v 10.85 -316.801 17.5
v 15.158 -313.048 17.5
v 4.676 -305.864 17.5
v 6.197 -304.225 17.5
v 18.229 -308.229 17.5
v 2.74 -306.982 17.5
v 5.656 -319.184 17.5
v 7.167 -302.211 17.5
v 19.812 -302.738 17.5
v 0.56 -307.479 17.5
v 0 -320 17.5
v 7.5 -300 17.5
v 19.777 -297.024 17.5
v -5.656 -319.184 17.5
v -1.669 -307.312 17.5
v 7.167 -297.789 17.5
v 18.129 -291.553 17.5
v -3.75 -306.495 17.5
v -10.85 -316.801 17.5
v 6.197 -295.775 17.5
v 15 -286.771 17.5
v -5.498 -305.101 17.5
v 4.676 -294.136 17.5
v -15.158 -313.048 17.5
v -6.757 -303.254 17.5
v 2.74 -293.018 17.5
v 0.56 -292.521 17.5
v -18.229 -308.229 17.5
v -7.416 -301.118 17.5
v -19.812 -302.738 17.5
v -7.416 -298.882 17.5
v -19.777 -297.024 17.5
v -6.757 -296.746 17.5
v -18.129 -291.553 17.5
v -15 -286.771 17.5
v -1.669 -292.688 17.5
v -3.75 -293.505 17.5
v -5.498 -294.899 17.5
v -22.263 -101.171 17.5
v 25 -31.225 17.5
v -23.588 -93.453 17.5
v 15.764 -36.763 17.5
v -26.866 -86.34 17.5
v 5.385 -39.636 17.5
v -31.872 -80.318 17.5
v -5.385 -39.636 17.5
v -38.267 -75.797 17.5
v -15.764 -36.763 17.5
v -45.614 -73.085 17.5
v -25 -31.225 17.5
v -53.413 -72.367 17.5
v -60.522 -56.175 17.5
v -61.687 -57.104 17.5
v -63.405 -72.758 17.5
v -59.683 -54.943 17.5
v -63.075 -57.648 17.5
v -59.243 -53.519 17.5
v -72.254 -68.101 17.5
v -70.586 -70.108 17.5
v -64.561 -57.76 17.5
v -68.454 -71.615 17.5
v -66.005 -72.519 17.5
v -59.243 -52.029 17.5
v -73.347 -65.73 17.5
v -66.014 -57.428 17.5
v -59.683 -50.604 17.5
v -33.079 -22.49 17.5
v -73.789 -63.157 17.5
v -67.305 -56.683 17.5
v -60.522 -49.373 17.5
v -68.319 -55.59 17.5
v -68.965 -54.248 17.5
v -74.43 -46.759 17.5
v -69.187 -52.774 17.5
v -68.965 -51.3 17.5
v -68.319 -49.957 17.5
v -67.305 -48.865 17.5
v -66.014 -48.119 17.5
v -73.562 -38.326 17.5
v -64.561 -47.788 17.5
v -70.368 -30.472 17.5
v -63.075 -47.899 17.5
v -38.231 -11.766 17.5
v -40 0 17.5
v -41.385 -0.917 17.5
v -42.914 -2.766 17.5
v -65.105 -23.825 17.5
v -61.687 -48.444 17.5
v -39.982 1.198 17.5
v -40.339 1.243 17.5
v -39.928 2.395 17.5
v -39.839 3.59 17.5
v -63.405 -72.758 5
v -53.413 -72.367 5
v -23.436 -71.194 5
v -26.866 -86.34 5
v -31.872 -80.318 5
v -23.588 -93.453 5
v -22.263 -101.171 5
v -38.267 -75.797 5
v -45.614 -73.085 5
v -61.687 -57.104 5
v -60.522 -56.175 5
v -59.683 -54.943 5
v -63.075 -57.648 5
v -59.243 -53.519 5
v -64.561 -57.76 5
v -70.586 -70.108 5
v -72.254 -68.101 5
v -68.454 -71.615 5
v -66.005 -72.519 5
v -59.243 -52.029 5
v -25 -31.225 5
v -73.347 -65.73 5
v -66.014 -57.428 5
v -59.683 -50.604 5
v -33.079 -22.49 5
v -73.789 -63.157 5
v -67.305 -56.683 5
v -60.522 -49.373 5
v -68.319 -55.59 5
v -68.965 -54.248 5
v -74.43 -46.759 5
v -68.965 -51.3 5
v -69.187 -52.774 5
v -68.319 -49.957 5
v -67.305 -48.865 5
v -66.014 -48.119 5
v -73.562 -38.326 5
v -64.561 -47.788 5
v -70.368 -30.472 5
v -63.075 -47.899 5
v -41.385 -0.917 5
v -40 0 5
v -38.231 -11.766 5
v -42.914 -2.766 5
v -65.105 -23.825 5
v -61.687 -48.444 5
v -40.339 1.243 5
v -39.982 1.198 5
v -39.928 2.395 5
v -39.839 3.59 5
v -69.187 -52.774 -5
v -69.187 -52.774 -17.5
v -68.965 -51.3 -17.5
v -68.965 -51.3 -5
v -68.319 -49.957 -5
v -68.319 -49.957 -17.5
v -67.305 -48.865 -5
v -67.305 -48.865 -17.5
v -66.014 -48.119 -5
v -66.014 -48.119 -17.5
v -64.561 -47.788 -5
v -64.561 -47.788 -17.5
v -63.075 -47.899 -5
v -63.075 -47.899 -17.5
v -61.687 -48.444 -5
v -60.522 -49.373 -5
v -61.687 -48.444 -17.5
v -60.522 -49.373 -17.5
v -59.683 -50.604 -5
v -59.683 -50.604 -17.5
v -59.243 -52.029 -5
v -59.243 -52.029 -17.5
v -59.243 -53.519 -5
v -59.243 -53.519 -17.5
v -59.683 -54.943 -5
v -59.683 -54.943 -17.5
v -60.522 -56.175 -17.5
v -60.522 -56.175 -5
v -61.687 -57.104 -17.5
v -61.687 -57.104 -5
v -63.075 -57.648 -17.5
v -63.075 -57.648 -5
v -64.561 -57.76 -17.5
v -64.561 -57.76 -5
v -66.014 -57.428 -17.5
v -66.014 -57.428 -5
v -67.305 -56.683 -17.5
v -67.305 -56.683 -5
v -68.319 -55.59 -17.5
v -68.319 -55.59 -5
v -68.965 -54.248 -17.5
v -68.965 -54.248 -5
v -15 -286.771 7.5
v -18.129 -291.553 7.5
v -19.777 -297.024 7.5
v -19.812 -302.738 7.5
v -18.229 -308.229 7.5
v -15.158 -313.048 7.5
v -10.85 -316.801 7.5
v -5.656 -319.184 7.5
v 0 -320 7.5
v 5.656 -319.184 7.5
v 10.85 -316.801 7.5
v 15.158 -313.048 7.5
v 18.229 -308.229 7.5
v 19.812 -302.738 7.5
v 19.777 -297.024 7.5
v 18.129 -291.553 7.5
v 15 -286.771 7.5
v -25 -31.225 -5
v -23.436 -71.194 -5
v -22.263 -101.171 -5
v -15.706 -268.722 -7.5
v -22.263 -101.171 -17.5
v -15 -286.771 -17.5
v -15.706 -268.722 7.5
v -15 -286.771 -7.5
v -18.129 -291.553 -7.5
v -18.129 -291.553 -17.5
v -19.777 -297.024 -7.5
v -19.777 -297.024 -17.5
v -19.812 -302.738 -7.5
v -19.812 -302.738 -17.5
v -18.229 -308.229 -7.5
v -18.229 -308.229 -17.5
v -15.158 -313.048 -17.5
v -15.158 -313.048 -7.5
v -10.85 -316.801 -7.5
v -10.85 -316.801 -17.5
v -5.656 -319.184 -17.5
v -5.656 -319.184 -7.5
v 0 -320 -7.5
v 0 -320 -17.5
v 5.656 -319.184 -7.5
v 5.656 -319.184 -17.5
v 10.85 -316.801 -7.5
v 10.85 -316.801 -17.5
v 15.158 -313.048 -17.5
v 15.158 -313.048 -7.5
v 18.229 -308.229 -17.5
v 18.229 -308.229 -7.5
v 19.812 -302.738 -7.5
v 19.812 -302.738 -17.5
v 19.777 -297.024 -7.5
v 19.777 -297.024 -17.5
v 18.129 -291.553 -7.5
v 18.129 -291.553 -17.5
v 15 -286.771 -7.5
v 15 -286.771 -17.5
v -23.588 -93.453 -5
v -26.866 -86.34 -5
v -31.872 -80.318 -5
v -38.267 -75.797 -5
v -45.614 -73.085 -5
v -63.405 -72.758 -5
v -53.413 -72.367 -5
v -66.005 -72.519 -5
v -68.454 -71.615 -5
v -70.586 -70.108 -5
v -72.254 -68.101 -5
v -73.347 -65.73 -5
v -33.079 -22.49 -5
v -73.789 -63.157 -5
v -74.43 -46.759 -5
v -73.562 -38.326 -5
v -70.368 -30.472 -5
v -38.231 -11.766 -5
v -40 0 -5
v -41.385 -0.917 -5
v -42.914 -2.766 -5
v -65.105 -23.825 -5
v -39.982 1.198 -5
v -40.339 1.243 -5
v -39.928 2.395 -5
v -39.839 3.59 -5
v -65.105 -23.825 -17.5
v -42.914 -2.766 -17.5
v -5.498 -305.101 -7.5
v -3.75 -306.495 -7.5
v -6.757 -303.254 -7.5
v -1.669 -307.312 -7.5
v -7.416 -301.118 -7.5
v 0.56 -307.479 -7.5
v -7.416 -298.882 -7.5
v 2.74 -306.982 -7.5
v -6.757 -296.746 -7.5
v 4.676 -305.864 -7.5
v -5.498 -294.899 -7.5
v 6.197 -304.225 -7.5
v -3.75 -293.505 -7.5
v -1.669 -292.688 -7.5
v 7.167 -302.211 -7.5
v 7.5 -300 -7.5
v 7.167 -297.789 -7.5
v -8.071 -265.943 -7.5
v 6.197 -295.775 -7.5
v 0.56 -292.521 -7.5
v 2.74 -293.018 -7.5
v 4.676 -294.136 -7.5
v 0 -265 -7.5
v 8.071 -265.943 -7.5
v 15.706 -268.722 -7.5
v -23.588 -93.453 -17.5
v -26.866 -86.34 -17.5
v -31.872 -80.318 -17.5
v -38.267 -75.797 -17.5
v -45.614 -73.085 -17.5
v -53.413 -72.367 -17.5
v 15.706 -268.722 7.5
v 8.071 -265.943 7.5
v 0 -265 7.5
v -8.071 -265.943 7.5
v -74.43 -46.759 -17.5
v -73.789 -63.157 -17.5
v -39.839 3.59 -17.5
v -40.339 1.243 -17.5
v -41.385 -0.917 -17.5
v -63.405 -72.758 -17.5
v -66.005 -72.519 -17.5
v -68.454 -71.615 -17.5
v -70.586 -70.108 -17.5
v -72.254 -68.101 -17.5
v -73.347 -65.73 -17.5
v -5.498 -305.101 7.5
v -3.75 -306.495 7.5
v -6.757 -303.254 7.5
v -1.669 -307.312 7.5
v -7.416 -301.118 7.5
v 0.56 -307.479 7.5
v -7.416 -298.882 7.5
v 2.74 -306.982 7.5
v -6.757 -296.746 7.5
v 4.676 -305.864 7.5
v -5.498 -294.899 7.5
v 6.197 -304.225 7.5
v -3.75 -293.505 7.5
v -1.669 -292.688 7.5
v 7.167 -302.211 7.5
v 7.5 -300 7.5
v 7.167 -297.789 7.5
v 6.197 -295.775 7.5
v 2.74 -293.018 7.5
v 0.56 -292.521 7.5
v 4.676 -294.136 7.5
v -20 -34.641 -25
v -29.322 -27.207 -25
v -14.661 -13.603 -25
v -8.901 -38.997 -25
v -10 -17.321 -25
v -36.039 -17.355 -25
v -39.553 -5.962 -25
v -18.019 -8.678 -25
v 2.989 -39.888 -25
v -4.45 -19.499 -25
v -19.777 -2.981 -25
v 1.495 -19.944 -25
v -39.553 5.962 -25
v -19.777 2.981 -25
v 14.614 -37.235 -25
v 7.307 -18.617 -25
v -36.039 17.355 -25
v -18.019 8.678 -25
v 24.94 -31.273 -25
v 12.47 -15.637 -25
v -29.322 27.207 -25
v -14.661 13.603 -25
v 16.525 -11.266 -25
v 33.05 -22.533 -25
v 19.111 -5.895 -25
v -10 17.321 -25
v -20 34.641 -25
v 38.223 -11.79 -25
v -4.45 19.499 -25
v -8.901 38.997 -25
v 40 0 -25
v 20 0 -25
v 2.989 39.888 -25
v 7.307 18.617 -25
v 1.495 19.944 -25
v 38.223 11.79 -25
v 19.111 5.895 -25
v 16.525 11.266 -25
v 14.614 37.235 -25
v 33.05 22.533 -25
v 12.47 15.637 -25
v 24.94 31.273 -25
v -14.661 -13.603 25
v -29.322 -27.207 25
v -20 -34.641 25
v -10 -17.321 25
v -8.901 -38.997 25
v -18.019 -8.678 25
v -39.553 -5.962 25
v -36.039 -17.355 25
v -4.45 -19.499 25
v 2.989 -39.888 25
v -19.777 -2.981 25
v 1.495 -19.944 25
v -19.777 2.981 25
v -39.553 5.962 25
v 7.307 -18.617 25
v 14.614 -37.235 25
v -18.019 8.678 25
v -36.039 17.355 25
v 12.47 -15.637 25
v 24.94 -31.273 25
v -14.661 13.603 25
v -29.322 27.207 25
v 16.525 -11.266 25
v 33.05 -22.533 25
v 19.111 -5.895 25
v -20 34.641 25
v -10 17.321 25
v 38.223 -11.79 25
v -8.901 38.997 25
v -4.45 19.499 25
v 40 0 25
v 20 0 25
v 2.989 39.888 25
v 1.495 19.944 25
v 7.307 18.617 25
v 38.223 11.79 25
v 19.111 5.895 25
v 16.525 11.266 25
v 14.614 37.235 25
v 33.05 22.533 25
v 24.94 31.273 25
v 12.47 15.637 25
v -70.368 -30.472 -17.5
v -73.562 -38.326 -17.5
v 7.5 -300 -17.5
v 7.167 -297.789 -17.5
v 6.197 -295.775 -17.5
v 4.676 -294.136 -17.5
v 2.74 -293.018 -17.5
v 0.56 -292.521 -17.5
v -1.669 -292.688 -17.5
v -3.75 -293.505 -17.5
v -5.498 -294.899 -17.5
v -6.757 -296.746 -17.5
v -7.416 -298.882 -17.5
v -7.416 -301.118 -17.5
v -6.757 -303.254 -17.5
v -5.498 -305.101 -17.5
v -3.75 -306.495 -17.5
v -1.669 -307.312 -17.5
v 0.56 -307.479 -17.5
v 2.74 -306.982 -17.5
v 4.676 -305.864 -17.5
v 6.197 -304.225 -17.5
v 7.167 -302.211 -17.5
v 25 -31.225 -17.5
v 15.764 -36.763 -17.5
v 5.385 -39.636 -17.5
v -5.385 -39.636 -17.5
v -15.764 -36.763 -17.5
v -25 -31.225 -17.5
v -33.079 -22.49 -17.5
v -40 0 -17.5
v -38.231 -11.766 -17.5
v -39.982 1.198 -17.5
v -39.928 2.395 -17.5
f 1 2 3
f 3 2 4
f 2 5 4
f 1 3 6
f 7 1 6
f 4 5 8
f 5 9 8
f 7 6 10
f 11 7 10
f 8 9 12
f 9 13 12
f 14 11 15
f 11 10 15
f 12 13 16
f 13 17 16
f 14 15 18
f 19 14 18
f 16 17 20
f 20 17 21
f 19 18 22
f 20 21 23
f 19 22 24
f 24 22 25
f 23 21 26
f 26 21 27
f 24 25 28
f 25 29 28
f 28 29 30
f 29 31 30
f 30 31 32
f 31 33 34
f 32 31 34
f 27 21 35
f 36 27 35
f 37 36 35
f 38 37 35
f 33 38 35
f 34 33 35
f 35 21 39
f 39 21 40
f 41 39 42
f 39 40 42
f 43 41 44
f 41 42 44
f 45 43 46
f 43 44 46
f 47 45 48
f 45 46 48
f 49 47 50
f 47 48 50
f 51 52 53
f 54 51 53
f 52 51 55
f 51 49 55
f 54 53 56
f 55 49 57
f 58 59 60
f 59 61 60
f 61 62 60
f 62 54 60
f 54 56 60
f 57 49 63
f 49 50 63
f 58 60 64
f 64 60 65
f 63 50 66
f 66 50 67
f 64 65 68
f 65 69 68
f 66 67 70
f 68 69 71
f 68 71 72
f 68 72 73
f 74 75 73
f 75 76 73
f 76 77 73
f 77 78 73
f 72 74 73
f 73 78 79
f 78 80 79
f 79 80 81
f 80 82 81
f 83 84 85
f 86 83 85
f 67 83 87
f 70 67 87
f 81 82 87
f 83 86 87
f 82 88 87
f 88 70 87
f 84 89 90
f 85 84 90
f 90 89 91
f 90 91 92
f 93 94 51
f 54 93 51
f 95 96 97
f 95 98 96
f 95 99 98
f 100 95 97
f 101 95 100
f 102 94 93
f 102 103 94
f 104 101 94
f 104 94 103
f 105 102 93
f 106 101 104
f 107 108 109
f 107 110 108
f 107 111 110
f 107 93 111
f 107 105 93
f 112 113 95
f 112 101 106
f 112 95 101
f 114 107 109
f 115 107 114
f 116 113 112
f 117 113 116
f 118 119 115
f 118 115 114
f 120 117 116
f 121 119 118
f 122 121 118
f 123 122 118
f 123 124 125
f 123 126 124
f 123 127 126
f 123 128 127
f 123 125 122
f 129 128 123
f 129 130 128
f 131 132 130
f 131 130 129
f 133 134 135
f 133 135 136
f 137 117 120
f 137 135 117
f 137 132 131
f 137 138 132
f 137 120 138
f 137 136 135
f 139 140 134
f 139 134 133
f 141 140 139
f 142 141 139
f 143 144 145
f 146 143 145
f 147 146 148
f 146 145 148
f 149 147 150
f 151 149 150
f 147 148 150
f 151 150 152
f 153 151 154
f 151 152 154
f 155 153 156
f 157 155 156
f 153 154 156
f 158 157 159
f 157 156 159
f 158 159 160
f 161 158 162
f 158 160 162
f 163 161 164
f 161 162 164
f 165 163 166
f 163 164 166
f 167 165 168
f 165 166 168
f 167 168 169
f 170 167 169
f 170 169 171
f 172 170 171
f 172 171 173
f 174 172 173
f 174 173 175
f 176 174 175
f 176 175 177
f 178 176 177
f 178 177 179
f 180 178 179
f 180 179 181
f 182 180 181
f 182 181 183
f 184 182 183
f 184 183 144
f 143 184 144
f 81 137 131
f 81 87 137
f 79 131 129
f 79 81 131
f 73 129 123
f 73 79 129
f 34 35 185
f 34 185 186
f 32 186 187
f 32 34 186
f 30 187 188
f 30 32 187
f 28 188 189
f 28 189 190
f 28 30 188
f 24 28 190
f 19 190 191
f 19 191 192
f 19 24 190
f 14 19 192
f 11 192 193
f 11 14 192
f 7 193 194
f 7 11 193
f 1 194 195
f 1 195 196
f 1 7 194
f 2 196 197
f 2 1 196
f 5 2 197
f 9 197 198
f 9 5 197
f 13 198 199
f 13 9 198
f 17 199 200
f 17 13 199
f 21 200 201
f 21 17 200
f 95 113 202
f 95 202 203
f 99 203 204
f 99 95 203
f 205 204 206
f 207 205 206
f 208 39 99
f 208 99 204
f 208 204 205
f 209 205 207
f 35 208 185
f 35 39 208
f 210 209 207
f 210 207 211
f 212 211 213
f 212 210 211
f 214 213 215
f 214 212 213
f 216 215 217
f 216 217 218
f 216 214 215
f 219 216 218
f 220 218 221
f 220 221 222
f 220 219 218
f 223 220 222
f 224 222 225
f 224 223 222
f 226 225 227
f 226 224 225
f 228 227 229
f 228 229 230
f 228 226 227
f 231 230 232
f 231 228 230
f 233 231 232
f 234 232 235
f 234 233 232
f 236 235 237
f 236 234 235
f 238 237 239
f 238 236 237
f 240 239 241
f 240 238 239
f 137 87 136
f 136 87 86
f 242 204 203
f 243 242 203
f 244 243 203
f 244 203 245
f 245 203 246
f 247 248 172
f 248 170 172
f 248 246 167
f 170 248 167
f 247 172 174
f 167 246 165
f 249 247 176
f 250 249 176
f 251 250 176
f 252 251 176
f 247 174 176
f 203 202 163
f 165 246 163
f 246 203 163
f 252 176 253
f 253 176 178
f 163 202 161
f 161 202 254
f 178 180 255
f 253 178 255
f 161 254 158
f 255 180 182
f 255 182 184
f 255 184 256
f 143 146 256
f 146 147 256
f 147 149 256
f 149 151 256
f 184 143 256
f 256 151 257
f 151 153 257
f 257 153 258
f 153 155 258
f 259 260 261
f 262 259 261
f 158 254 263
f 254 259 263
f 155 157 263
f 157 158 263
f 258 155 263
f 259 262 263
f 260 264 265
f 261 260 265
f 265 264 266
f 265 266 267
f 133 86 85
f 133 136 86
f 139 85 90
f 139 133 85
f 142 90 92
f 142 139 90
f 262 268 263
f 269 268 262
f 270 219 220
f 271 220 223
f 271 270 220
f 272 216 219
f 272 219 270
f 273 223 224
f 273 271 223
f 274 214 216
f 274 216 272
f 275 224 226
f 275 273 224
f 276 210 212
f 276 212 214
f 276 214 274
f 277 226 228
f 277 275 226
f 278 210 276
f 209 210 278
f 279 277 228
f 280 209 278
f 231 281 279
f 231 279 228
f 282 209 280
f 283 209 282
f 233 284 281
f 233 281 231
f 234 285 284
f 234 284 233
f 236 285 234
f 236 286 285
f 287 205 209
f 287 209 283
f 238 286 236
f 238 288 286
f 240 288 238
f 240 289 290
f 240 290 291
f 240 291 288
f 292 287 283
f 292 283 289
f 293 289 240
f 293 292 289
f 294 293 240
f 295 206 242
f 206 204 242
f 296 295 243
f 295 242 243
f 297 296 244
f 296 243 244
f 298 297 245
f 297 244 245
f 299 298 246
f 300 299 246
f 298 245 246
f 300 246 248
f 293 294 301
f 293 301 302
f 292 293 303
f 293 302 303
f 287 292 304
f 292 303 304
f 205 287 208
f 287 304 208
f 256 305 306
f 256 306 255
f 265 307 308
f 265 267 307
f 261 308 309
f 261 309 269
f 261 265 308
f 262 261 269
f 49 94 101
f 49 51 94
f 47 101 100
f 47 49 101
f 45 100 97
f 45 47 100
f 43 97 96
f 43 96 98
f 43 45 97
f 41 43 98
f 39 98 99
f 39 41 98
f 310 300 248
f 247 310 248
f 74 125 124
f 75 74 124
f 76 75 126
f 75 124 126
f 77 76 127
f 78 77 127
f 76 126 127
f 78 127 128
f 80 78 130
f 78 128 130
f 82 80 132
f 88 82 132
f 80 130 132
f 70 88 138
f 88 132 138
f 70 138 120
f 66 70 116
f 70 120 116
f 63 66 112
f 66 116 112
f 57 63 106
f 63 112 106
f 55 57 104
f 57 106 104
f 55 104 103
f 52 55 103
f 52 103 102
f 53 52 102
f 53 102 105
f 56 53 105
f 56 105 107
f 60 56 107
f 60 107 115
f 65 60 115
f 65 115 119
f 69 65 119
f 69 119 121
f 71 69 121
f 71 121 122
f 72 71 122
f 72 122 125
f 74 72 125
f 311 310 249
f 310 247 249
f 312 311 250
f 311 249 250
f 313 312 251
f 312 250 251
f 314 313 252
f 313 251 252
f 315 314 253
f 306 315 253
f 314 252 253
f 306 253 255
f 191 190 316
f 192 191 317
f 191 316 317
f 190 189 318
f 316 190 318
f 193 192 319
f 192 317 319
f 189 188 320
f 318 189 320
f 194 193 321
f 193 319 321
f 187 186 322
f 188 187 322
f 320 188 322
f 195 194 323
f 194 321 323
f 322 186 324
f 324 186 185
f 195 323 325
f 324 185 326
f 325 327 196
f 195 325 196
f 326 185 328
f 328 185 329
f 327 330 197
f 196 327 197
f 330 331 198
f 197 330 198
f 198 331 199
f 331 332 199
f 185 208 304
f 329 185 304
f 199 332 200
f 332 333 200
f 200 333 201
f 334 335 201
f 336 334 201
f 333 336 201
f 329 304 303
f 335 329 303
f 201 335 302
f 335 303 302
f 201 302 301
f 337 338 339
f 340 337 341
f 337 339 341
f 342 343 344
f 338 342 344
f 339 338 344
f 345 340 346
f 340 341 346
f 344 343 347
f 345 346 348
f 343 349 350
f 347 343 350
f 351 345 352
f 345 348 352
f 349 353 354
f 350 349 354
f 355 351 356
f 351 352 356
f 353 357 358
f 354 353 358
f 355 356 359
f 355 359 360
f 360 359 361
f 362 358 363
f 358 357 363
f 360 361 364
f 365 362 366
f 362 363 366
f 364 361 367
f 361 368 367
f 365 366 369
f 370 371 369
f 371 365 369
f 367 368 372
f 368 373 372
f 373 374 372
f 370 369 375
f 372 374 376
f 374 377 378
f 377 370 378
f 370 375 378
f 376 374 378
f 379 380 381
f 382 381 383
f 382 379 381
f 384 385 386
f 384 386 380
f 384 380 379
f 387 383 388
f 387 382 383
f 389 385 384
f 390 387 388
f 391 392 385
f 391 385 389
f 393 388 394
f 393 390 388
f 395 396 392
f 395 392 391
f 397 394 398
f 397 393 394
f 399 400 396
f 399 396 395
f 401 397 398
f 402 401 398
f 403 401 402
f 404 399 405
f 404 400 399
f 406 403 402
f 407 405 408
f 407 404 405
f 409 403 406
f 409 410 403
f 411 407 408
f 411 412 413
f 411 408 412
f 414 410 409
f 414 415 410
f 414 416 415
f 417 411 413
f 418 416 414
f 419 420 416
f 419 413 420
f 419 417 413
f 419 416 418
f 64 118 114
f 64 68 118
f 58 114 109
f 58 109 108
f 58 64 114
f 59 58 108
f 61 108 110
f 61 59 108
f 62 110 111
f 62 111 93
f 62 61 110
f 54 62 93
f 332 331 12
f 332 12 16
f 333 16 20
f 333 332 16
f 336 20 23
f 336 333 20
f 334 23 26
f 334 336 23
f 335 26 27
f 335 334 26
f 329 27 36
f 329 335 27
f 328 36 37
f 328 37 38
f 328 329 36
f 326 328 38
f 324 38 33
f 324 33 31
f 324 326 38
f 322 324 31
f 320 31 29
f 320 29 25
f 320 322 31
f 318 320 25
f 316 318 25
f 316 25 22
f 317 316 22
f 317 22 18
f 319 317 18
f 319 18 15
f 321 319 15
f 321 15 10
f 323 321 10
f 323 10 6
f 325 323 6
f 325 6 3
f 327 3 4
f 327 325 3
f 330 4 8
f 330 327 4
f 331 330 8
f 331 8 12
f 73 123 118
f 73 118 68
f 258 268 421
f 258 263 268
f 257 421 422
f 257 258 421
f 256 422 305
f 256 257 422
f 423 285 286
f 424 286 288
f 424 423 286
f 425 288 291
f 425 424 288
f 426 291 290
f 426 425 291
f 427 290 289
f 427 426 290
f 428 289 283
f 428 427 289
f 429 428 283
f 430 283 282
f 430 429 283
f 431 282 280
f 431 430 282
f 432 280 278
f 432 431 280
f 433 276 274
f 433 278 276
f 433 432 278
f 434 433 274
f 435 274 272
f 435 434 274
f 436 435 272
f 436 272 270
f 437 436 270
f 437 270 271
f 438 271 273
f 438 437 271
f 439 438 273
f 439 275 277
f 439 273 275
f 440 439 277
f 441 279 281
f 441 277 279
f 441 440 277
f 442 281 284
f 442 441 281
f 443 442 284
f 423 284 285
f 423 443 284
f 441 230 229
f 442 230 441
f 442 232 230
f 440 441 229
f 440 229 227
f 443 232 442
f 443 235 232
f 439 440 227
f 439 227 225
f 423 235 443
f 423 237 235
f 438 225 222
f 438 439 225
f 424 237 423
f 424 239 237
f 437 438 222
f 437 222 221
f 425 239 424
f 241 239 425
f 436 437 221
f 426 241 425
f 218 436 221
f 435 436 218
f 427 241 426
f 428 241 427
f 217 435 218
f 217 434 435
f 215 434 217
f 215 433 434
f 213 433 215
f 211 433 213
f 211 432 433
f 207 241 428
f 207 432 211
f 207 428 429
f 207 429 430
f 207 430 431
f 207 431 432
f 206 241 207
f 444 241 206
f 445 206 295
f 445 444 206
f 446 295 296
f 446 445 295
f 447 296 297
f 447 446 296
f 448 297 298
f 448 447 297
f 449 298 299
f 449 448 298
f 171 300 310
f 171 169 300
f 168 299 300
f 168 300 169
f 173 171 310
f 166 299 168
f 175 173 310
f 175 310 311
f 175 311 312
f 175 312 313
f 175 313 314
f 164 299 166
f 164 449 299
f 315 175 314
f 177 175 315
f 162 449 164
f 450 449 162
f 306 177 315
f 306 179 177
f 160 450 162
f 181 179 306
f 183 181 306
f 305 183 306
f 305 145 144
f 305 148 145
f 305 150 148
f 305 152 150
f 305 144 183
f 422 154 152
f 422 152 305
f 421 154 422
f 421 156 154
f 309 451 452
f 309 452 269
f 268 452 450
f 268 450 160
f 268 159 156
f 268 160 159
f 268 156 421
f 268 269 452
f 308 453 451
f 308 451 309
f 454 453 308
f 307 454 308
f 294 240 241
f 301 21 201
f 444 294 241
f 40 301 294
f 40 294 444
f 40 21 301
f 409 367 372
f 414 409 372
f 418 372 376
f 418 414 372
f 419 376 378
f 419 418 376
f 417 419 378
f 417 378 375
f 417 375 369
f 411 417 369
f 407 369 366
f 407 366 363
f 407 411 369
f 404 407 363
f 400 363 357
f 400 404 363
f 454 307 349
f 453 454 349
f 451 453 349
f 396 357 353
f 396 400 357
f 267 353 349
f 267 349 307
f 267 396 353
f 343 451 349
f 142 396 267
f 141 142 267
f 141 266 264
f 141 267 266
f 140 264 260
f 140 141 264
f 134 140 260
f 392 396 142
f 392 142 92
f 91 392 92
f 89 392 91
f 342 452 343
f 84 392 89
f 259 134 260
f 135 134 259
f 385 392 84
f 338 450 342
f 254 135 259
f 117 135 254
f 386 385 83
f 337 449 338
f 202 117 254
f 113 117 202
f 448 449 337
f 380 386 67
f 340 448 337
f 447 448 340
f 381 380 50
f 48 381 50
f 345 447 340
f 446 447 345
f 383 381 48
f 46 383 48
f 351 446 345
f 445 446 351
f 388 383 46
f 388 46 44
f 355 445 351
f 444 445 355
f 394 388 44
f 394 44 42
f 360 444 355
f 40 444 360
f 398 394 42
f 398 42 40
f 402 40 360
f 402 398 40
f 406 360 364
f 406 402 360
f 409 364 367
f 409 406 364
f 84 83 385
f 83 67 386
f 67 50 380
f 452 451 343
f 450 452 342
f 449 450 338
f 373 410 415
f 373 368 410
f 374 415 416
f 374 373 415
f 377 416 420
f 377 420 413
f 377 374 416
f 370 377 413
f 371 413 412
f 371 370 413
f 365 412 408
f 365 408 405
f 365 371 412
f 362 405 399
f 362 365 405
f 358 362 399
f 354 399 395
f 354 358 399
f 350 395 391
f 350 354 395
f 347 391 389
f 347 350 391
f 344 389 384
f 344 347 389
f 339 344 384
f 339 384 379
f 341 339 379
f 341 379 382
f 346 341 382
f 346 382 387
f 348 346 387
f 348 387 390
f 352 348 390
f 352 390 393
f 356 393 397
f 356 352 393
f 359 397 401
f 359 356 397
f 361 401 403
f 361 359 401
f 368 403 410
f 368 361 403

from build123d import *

# Parameters (mm, degrees)
SKETCH1_R           = 40
SKETCH1_R_2         = 20
BOSS_EXTRUDE1_DEPTH = 25
SKETCH3_R           = 7.5
BOSS_EXTRUDE3_DEPTH = 17.5
SKETCH5_R           = 35
CUT_EXTRUDE1_DEPTH  = 7.5
SKETCH6_W           = 12.5
SKETCH6_H           = 40
BOSS_EXTRUDE4_DEPTH = 50
SKETCH7_R           = 5
CUT_EXTRUDE2_DEPTH  = 43.5
BOSS_EXTRUDE5_DEPTH = 12.5
FILLET2_R           = 10
FILLET3_R           = 30
FILLET4_R           = 10
FILLET5_R           = 30


with BuildPart() as part:
    # Sketch1 → Boss-Extrude1 (new body, symmetric)
    with BuildSketch(Plane.XY):
        Circle(SKETCH1_R)
        Circle(SKETCH1_R_2, mode=Mode.SUBTRACT)
    extrude(amount=BOSS_EXTRUDE1_DEPTH, both=True)

    # Sketch3 → Boss-Extrude3 (add, symmetric)
    with BuildSketch(Plane.XY):
        with BuildLine():
            Line((-25, -31.224989992), (-15, -286.771243445))
            ThreePointArc((-15, -286.771243445), (0, -320), (15, -286.771243445))
            Line((15, -286.771243445), (25, -31.224989992))
            ThreePointArc((25, -31.224989992), (0, -40), (-25, -31.224989992))
        make_face()
        with Locations((0, -300)):
            Circle(SKETCH3_R, mode=Mode.SUBTRACT)
    extrude(amount=BOSS_EXTRUDE3_DEPTH, both=True)

    # Sketch5 → Cut-Extrude1 (cut, symmetric)
    with BuildSketch(Plane.XY):
        with Locations((0, -300)):
            Circle(SKETCH5_R)
    extrude(amount=CUT_EXTRUDE1_DEPTH, both=True, mode=Mode.SUBTRACT)

    # Sketch6 → Boss-Extrude4 (add)
    with BuildSketch(Plane(origin=(-26.181799658, -1.024542497, 0), x_dir=(0, 0, 1), z_dir=(-0.999235227, -0.039101932, 0))):
        with Locations((11.25, -50.223561659)):
            Rectangle(SKETCH6_W, SKETCH6_H)
        with Locations((-11.25, -50.223561659)):
            Rectangle(SKETCH6_W, SKETCH6_H)
    extrude(amount=BOSS_EXTRUDE4_DEPTH)

    # Sketch7 → Cut-Extrude2 (cut, through all)
    with BuildSketch(Plane(origin=(0, 0, -17.5), x_dir=(-1, 0, 0), z_dir=(0, 0, -1))):
        with Locations((64.187370437, -52.773771819)):
            Circle(SKETCH7_R)
    extrude(amount=-CUT_EXTRUDE2_DEPTH, mode=Mode.SUBTRACT)

    # Sketch8 → Boss-Extrude5 (add)
    with BuildSketch(Plane(origin=(0, 0, -17.5), x_dir=(-1, 0, 0), z_dir=(0, 0, -1))):
        with BuildLine():
            Line((74.961761351, -33.180086601), (40, 0))
            ThreePointArc((40, 0), (36.055512755, -17.320508076), (25, -31.224989992))
            Line((25, -31.224989992), (74.961761351, -33.180086601))
        make_face()
    boss_extrude5 = extrude(amount=-BOSS_EXTRUDE5_DEPTH)

    # Mirror2: Boss-Extrude5 across plane
    add(boss_extrude5.mirror(Plane.XY))

    # Fillet2
    fillet2_edges = [part.edges().sort_by_distance(p)[0] for p in [
        (-73.397684064, -73.149495681, 11.25),
        (-73.397684064, -73.149495681, -11.25),
    ]]
    fillet(fillet2_edges, radius=FILLET2_R)

    # Fillet3
    fillet3_edges = [part.edges().sort_by_distance(p)[0] for p in [
        (-23.435922713, -71.194399072, 11.25),
        (-23.435922713, -71.194399072, -11.25),
    ]]
    fillet(fillet3_edges, radius=FILLET3_R)

    # Fillet4
    fillet4_edges = [part.edges().sort_by_distance(p)[0] for p in [
        (-40, 0, -11.25),
        (-40, 0, 11.25),
    ]]
    fillet(fillet4_edges, radius=FILLET4_R)

    # Fillet5
    fillet5_edges = [part.edges().sort_by_distance(p)[0] for p in [
        (-74.961761351, -33.180086601, 11.25),
        (-74.961761351, -33.180086601, -11.25),
    ]]
    fillet(fillet5_edges, radius=FILLET5_R)


solid = part.part
